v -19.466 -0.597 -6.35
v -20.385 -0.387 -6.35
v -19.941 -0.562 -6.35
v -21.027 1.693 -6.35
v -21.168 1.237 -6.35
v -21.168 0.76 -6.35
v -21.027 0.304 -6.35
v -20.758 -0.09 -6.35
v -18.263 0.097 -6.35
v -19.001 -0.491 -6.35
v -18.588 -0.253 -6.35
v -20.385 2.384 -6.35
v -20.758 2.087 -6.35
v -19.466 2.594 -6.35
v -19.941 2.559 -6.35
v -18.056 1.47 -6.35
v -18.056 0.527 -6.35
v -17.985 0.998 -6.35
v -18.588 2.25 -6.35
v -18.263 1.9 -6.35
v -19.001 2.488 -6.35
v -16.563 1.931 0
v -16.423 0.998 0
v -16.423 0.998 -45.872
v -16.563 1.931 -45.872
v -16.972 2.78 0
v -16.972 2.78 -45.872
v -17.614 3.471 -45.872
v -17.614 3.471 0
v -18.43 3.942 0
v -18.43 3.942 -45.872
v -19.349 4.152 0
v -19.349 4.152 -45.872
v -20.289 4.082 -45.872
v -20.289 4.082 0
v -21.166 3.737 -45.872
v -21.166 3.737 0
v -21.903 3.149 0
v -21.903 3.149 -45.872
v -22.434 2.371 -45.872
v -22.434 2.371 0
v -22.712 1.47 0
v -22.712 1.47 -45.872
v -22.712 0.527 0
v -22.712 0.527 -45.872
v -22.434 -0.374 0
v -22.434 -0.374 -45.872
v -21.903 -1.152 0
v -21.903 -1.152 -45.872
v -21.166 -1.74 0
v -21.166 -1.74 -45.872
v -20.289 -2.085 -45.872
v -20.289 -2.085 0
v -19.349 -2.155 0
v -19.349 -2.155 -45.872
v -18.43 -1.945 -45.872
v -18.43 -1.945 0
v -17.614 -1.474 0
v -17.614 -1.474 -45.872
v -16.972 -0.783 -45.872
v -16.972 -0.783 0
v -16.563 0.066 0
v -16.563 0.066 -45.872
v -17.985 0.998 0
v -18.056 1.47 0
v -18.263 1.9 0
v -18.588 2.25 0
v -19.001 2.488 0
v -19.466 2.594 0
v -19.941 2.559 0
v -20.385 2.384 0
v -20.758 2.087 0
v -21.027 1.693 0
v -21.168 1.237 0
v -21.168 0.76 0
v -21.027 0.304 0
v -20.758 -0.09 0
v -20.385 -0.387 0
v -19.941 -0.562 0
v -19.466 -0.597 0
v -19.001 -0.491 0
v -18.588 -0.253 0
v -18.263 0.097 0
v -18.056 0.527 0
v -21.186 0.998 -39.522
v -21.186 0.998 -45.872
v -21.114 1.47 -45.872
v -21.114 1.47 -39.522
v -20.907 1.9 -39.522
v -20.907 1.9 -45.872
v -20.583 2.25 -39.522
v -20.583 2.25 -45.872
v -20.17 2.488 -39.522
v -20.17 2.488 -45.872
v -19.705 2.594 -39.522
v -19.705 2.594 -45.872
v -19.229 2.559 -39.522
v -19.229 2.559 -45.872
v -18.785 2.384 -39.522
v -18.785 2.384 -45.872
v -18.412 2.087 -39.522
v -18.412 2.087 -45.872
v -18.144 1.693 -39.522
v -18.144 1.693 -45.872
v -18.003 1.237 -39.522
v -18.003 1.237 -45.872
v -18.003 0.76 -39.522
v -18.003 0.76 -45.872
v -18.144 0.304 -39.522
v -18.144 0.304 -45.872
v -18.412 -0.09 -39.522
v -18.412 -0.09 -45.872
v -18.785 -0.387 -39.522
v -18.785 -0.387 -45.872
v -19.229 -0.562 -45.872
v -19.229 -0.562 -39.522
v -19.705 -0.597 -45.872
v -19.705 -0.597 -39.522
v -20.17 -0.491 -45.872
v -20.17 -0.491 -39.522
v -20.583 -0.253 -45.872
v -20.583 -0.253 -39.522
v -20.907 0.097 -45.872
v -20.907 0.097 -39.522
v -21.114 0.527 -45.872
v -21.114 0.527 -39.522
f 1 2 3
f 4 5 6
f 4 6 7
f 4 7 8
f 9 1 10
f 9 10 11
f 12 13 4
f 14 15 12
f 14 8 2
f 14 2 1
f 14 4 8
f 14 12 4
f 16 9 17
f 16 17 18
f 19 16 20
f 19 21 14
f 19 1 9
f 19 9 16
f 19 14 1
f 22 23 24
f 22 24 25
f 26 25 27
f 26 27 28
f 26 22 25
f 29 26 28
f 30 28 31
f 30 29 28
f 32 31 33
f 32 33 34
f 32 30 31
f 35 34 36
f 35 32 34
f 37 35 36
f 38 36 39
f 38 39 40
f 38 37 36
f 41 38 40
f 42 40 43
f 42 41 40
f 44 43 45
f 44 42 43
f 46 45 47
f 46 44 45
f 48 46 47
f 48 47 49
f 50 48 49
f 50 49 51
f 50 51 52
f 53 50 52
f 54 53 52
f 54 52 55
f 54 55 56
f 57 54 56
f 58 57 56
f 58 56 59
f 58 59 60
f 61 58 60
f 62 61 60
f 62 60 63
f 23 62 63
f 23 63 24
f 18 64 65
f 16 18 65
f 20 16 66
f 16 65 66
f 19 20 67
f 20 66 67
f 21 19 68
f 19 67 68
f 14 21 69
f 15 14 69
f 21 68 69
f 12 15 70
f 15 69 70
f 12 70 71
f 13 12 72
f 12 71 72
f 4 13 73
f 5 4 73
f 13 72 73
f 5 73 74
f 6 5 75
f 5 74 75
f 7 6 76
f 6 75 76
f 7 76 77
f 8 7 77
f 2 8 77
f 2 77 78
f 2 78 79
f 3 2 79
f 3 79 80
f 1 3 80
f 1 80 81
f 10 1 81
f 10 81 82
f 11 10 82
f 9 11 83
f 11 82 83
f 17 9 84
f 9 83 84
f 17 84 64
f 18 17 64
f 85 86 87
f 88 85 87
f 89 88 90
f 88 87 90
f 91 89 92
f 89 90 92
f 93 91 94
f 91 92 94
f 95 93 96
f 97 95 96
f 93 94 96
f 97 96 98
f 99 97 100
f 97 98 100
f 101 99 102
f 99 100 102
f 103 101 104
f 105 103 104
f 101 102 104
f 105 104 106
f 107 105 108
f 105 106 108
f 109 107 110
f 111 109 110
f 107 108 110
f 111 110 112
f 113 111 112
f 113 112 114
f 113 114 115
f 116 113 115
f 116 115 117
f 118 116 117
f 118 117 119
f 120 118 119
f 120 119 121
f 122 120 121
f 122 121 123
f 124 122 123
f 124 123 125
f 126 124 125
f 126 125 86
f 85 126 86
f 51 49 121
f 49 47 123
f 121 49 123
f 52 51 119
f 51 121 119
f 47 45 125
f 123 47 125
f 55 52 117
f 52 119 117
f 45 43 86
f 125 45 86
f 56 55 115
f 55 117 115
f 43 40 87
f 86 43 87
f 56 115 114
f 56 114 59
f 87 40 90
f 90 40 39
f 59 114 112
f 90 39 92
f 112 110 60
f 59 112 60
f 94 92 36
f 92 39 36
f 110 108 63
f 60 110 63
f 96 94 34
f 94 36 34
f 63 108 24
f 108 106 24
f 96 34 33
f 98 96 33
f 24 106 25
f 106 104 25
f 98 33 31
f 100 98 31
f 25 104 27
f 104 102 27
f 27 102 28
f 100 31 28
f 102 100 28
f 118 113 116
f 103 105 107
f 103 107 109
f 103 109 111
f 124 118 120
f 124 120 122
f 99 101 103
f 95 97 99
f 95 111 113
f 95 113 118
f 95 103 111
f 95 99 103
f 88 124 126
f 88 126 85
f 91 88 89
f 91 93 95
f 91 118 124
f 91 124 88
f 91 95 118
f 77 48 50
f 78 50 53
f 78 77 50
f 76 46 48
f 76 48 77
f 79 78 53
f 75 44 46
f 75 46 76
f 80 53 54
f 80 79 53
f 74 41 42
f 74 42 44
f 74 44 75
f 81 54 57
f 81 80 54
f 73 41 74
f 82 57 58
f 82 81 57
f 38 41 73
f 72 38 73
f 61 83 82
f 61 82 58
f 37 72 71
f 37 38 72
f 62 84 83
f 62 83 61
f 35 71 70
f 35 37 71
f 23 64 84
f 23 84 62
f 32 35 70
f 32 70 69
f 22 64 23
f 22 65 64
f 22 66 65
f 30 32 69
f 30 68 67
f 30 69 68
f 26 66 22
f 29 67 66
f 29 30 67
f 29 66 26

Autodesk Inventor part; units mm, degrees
ref_plane "YZ Plane" through (0, 0, 0) normal (1, 0, 0) x (0, 1, 0)
ref_plane "XZ Plane" through (0, 0, 0) normal (0, 1, 0) x (-1, 0, 0)
ref_plane "XY Plane" through (0, 0, 0) normal (0, 0, 1) x (1, 0, 0)
sketch "Sketch1" plane through (0, 0, 0) normal (0, 0, 1) x (1, 0, 0)
  circle A0 centre (-19.5853, 0.9985) radius 3.1623
  dimension "d0" = 6.3246
extrude "Extrusion1" add sketch "Sketch1" against normal blind 45.8724
sketch "Sketch2" plane through (-19.5853, 0.9985, 0) normal (0, 0, 1) x (1, 0, 0)
  circle A0 centre (0, 0) radius 3.1623 projected
  circle A1 centre (0, 0) radius 1.6002
  dimension "d3" = 3.2004
extrude "Extrusion2" cut sketch "Sketch2" against normal blind 6.35 contours A1
sketch "Sketch3" plane through (-19.5853, 0.9985, -45.8724) normal (0, 0, -1) x (-1, 0, 0)
  circle A0 centre (0, 0) radius 3.1623 projected
  circle A1 centre (0, 0) radius 1.6002
  dimension "d6" = 3.2004
extrude "Extrusion3" cut sketch "Sketch3" against normal blind 6.35 contours A1
properties part number "Roller Axle V4 1764" material "Steel, High Strength Low Alloy"
